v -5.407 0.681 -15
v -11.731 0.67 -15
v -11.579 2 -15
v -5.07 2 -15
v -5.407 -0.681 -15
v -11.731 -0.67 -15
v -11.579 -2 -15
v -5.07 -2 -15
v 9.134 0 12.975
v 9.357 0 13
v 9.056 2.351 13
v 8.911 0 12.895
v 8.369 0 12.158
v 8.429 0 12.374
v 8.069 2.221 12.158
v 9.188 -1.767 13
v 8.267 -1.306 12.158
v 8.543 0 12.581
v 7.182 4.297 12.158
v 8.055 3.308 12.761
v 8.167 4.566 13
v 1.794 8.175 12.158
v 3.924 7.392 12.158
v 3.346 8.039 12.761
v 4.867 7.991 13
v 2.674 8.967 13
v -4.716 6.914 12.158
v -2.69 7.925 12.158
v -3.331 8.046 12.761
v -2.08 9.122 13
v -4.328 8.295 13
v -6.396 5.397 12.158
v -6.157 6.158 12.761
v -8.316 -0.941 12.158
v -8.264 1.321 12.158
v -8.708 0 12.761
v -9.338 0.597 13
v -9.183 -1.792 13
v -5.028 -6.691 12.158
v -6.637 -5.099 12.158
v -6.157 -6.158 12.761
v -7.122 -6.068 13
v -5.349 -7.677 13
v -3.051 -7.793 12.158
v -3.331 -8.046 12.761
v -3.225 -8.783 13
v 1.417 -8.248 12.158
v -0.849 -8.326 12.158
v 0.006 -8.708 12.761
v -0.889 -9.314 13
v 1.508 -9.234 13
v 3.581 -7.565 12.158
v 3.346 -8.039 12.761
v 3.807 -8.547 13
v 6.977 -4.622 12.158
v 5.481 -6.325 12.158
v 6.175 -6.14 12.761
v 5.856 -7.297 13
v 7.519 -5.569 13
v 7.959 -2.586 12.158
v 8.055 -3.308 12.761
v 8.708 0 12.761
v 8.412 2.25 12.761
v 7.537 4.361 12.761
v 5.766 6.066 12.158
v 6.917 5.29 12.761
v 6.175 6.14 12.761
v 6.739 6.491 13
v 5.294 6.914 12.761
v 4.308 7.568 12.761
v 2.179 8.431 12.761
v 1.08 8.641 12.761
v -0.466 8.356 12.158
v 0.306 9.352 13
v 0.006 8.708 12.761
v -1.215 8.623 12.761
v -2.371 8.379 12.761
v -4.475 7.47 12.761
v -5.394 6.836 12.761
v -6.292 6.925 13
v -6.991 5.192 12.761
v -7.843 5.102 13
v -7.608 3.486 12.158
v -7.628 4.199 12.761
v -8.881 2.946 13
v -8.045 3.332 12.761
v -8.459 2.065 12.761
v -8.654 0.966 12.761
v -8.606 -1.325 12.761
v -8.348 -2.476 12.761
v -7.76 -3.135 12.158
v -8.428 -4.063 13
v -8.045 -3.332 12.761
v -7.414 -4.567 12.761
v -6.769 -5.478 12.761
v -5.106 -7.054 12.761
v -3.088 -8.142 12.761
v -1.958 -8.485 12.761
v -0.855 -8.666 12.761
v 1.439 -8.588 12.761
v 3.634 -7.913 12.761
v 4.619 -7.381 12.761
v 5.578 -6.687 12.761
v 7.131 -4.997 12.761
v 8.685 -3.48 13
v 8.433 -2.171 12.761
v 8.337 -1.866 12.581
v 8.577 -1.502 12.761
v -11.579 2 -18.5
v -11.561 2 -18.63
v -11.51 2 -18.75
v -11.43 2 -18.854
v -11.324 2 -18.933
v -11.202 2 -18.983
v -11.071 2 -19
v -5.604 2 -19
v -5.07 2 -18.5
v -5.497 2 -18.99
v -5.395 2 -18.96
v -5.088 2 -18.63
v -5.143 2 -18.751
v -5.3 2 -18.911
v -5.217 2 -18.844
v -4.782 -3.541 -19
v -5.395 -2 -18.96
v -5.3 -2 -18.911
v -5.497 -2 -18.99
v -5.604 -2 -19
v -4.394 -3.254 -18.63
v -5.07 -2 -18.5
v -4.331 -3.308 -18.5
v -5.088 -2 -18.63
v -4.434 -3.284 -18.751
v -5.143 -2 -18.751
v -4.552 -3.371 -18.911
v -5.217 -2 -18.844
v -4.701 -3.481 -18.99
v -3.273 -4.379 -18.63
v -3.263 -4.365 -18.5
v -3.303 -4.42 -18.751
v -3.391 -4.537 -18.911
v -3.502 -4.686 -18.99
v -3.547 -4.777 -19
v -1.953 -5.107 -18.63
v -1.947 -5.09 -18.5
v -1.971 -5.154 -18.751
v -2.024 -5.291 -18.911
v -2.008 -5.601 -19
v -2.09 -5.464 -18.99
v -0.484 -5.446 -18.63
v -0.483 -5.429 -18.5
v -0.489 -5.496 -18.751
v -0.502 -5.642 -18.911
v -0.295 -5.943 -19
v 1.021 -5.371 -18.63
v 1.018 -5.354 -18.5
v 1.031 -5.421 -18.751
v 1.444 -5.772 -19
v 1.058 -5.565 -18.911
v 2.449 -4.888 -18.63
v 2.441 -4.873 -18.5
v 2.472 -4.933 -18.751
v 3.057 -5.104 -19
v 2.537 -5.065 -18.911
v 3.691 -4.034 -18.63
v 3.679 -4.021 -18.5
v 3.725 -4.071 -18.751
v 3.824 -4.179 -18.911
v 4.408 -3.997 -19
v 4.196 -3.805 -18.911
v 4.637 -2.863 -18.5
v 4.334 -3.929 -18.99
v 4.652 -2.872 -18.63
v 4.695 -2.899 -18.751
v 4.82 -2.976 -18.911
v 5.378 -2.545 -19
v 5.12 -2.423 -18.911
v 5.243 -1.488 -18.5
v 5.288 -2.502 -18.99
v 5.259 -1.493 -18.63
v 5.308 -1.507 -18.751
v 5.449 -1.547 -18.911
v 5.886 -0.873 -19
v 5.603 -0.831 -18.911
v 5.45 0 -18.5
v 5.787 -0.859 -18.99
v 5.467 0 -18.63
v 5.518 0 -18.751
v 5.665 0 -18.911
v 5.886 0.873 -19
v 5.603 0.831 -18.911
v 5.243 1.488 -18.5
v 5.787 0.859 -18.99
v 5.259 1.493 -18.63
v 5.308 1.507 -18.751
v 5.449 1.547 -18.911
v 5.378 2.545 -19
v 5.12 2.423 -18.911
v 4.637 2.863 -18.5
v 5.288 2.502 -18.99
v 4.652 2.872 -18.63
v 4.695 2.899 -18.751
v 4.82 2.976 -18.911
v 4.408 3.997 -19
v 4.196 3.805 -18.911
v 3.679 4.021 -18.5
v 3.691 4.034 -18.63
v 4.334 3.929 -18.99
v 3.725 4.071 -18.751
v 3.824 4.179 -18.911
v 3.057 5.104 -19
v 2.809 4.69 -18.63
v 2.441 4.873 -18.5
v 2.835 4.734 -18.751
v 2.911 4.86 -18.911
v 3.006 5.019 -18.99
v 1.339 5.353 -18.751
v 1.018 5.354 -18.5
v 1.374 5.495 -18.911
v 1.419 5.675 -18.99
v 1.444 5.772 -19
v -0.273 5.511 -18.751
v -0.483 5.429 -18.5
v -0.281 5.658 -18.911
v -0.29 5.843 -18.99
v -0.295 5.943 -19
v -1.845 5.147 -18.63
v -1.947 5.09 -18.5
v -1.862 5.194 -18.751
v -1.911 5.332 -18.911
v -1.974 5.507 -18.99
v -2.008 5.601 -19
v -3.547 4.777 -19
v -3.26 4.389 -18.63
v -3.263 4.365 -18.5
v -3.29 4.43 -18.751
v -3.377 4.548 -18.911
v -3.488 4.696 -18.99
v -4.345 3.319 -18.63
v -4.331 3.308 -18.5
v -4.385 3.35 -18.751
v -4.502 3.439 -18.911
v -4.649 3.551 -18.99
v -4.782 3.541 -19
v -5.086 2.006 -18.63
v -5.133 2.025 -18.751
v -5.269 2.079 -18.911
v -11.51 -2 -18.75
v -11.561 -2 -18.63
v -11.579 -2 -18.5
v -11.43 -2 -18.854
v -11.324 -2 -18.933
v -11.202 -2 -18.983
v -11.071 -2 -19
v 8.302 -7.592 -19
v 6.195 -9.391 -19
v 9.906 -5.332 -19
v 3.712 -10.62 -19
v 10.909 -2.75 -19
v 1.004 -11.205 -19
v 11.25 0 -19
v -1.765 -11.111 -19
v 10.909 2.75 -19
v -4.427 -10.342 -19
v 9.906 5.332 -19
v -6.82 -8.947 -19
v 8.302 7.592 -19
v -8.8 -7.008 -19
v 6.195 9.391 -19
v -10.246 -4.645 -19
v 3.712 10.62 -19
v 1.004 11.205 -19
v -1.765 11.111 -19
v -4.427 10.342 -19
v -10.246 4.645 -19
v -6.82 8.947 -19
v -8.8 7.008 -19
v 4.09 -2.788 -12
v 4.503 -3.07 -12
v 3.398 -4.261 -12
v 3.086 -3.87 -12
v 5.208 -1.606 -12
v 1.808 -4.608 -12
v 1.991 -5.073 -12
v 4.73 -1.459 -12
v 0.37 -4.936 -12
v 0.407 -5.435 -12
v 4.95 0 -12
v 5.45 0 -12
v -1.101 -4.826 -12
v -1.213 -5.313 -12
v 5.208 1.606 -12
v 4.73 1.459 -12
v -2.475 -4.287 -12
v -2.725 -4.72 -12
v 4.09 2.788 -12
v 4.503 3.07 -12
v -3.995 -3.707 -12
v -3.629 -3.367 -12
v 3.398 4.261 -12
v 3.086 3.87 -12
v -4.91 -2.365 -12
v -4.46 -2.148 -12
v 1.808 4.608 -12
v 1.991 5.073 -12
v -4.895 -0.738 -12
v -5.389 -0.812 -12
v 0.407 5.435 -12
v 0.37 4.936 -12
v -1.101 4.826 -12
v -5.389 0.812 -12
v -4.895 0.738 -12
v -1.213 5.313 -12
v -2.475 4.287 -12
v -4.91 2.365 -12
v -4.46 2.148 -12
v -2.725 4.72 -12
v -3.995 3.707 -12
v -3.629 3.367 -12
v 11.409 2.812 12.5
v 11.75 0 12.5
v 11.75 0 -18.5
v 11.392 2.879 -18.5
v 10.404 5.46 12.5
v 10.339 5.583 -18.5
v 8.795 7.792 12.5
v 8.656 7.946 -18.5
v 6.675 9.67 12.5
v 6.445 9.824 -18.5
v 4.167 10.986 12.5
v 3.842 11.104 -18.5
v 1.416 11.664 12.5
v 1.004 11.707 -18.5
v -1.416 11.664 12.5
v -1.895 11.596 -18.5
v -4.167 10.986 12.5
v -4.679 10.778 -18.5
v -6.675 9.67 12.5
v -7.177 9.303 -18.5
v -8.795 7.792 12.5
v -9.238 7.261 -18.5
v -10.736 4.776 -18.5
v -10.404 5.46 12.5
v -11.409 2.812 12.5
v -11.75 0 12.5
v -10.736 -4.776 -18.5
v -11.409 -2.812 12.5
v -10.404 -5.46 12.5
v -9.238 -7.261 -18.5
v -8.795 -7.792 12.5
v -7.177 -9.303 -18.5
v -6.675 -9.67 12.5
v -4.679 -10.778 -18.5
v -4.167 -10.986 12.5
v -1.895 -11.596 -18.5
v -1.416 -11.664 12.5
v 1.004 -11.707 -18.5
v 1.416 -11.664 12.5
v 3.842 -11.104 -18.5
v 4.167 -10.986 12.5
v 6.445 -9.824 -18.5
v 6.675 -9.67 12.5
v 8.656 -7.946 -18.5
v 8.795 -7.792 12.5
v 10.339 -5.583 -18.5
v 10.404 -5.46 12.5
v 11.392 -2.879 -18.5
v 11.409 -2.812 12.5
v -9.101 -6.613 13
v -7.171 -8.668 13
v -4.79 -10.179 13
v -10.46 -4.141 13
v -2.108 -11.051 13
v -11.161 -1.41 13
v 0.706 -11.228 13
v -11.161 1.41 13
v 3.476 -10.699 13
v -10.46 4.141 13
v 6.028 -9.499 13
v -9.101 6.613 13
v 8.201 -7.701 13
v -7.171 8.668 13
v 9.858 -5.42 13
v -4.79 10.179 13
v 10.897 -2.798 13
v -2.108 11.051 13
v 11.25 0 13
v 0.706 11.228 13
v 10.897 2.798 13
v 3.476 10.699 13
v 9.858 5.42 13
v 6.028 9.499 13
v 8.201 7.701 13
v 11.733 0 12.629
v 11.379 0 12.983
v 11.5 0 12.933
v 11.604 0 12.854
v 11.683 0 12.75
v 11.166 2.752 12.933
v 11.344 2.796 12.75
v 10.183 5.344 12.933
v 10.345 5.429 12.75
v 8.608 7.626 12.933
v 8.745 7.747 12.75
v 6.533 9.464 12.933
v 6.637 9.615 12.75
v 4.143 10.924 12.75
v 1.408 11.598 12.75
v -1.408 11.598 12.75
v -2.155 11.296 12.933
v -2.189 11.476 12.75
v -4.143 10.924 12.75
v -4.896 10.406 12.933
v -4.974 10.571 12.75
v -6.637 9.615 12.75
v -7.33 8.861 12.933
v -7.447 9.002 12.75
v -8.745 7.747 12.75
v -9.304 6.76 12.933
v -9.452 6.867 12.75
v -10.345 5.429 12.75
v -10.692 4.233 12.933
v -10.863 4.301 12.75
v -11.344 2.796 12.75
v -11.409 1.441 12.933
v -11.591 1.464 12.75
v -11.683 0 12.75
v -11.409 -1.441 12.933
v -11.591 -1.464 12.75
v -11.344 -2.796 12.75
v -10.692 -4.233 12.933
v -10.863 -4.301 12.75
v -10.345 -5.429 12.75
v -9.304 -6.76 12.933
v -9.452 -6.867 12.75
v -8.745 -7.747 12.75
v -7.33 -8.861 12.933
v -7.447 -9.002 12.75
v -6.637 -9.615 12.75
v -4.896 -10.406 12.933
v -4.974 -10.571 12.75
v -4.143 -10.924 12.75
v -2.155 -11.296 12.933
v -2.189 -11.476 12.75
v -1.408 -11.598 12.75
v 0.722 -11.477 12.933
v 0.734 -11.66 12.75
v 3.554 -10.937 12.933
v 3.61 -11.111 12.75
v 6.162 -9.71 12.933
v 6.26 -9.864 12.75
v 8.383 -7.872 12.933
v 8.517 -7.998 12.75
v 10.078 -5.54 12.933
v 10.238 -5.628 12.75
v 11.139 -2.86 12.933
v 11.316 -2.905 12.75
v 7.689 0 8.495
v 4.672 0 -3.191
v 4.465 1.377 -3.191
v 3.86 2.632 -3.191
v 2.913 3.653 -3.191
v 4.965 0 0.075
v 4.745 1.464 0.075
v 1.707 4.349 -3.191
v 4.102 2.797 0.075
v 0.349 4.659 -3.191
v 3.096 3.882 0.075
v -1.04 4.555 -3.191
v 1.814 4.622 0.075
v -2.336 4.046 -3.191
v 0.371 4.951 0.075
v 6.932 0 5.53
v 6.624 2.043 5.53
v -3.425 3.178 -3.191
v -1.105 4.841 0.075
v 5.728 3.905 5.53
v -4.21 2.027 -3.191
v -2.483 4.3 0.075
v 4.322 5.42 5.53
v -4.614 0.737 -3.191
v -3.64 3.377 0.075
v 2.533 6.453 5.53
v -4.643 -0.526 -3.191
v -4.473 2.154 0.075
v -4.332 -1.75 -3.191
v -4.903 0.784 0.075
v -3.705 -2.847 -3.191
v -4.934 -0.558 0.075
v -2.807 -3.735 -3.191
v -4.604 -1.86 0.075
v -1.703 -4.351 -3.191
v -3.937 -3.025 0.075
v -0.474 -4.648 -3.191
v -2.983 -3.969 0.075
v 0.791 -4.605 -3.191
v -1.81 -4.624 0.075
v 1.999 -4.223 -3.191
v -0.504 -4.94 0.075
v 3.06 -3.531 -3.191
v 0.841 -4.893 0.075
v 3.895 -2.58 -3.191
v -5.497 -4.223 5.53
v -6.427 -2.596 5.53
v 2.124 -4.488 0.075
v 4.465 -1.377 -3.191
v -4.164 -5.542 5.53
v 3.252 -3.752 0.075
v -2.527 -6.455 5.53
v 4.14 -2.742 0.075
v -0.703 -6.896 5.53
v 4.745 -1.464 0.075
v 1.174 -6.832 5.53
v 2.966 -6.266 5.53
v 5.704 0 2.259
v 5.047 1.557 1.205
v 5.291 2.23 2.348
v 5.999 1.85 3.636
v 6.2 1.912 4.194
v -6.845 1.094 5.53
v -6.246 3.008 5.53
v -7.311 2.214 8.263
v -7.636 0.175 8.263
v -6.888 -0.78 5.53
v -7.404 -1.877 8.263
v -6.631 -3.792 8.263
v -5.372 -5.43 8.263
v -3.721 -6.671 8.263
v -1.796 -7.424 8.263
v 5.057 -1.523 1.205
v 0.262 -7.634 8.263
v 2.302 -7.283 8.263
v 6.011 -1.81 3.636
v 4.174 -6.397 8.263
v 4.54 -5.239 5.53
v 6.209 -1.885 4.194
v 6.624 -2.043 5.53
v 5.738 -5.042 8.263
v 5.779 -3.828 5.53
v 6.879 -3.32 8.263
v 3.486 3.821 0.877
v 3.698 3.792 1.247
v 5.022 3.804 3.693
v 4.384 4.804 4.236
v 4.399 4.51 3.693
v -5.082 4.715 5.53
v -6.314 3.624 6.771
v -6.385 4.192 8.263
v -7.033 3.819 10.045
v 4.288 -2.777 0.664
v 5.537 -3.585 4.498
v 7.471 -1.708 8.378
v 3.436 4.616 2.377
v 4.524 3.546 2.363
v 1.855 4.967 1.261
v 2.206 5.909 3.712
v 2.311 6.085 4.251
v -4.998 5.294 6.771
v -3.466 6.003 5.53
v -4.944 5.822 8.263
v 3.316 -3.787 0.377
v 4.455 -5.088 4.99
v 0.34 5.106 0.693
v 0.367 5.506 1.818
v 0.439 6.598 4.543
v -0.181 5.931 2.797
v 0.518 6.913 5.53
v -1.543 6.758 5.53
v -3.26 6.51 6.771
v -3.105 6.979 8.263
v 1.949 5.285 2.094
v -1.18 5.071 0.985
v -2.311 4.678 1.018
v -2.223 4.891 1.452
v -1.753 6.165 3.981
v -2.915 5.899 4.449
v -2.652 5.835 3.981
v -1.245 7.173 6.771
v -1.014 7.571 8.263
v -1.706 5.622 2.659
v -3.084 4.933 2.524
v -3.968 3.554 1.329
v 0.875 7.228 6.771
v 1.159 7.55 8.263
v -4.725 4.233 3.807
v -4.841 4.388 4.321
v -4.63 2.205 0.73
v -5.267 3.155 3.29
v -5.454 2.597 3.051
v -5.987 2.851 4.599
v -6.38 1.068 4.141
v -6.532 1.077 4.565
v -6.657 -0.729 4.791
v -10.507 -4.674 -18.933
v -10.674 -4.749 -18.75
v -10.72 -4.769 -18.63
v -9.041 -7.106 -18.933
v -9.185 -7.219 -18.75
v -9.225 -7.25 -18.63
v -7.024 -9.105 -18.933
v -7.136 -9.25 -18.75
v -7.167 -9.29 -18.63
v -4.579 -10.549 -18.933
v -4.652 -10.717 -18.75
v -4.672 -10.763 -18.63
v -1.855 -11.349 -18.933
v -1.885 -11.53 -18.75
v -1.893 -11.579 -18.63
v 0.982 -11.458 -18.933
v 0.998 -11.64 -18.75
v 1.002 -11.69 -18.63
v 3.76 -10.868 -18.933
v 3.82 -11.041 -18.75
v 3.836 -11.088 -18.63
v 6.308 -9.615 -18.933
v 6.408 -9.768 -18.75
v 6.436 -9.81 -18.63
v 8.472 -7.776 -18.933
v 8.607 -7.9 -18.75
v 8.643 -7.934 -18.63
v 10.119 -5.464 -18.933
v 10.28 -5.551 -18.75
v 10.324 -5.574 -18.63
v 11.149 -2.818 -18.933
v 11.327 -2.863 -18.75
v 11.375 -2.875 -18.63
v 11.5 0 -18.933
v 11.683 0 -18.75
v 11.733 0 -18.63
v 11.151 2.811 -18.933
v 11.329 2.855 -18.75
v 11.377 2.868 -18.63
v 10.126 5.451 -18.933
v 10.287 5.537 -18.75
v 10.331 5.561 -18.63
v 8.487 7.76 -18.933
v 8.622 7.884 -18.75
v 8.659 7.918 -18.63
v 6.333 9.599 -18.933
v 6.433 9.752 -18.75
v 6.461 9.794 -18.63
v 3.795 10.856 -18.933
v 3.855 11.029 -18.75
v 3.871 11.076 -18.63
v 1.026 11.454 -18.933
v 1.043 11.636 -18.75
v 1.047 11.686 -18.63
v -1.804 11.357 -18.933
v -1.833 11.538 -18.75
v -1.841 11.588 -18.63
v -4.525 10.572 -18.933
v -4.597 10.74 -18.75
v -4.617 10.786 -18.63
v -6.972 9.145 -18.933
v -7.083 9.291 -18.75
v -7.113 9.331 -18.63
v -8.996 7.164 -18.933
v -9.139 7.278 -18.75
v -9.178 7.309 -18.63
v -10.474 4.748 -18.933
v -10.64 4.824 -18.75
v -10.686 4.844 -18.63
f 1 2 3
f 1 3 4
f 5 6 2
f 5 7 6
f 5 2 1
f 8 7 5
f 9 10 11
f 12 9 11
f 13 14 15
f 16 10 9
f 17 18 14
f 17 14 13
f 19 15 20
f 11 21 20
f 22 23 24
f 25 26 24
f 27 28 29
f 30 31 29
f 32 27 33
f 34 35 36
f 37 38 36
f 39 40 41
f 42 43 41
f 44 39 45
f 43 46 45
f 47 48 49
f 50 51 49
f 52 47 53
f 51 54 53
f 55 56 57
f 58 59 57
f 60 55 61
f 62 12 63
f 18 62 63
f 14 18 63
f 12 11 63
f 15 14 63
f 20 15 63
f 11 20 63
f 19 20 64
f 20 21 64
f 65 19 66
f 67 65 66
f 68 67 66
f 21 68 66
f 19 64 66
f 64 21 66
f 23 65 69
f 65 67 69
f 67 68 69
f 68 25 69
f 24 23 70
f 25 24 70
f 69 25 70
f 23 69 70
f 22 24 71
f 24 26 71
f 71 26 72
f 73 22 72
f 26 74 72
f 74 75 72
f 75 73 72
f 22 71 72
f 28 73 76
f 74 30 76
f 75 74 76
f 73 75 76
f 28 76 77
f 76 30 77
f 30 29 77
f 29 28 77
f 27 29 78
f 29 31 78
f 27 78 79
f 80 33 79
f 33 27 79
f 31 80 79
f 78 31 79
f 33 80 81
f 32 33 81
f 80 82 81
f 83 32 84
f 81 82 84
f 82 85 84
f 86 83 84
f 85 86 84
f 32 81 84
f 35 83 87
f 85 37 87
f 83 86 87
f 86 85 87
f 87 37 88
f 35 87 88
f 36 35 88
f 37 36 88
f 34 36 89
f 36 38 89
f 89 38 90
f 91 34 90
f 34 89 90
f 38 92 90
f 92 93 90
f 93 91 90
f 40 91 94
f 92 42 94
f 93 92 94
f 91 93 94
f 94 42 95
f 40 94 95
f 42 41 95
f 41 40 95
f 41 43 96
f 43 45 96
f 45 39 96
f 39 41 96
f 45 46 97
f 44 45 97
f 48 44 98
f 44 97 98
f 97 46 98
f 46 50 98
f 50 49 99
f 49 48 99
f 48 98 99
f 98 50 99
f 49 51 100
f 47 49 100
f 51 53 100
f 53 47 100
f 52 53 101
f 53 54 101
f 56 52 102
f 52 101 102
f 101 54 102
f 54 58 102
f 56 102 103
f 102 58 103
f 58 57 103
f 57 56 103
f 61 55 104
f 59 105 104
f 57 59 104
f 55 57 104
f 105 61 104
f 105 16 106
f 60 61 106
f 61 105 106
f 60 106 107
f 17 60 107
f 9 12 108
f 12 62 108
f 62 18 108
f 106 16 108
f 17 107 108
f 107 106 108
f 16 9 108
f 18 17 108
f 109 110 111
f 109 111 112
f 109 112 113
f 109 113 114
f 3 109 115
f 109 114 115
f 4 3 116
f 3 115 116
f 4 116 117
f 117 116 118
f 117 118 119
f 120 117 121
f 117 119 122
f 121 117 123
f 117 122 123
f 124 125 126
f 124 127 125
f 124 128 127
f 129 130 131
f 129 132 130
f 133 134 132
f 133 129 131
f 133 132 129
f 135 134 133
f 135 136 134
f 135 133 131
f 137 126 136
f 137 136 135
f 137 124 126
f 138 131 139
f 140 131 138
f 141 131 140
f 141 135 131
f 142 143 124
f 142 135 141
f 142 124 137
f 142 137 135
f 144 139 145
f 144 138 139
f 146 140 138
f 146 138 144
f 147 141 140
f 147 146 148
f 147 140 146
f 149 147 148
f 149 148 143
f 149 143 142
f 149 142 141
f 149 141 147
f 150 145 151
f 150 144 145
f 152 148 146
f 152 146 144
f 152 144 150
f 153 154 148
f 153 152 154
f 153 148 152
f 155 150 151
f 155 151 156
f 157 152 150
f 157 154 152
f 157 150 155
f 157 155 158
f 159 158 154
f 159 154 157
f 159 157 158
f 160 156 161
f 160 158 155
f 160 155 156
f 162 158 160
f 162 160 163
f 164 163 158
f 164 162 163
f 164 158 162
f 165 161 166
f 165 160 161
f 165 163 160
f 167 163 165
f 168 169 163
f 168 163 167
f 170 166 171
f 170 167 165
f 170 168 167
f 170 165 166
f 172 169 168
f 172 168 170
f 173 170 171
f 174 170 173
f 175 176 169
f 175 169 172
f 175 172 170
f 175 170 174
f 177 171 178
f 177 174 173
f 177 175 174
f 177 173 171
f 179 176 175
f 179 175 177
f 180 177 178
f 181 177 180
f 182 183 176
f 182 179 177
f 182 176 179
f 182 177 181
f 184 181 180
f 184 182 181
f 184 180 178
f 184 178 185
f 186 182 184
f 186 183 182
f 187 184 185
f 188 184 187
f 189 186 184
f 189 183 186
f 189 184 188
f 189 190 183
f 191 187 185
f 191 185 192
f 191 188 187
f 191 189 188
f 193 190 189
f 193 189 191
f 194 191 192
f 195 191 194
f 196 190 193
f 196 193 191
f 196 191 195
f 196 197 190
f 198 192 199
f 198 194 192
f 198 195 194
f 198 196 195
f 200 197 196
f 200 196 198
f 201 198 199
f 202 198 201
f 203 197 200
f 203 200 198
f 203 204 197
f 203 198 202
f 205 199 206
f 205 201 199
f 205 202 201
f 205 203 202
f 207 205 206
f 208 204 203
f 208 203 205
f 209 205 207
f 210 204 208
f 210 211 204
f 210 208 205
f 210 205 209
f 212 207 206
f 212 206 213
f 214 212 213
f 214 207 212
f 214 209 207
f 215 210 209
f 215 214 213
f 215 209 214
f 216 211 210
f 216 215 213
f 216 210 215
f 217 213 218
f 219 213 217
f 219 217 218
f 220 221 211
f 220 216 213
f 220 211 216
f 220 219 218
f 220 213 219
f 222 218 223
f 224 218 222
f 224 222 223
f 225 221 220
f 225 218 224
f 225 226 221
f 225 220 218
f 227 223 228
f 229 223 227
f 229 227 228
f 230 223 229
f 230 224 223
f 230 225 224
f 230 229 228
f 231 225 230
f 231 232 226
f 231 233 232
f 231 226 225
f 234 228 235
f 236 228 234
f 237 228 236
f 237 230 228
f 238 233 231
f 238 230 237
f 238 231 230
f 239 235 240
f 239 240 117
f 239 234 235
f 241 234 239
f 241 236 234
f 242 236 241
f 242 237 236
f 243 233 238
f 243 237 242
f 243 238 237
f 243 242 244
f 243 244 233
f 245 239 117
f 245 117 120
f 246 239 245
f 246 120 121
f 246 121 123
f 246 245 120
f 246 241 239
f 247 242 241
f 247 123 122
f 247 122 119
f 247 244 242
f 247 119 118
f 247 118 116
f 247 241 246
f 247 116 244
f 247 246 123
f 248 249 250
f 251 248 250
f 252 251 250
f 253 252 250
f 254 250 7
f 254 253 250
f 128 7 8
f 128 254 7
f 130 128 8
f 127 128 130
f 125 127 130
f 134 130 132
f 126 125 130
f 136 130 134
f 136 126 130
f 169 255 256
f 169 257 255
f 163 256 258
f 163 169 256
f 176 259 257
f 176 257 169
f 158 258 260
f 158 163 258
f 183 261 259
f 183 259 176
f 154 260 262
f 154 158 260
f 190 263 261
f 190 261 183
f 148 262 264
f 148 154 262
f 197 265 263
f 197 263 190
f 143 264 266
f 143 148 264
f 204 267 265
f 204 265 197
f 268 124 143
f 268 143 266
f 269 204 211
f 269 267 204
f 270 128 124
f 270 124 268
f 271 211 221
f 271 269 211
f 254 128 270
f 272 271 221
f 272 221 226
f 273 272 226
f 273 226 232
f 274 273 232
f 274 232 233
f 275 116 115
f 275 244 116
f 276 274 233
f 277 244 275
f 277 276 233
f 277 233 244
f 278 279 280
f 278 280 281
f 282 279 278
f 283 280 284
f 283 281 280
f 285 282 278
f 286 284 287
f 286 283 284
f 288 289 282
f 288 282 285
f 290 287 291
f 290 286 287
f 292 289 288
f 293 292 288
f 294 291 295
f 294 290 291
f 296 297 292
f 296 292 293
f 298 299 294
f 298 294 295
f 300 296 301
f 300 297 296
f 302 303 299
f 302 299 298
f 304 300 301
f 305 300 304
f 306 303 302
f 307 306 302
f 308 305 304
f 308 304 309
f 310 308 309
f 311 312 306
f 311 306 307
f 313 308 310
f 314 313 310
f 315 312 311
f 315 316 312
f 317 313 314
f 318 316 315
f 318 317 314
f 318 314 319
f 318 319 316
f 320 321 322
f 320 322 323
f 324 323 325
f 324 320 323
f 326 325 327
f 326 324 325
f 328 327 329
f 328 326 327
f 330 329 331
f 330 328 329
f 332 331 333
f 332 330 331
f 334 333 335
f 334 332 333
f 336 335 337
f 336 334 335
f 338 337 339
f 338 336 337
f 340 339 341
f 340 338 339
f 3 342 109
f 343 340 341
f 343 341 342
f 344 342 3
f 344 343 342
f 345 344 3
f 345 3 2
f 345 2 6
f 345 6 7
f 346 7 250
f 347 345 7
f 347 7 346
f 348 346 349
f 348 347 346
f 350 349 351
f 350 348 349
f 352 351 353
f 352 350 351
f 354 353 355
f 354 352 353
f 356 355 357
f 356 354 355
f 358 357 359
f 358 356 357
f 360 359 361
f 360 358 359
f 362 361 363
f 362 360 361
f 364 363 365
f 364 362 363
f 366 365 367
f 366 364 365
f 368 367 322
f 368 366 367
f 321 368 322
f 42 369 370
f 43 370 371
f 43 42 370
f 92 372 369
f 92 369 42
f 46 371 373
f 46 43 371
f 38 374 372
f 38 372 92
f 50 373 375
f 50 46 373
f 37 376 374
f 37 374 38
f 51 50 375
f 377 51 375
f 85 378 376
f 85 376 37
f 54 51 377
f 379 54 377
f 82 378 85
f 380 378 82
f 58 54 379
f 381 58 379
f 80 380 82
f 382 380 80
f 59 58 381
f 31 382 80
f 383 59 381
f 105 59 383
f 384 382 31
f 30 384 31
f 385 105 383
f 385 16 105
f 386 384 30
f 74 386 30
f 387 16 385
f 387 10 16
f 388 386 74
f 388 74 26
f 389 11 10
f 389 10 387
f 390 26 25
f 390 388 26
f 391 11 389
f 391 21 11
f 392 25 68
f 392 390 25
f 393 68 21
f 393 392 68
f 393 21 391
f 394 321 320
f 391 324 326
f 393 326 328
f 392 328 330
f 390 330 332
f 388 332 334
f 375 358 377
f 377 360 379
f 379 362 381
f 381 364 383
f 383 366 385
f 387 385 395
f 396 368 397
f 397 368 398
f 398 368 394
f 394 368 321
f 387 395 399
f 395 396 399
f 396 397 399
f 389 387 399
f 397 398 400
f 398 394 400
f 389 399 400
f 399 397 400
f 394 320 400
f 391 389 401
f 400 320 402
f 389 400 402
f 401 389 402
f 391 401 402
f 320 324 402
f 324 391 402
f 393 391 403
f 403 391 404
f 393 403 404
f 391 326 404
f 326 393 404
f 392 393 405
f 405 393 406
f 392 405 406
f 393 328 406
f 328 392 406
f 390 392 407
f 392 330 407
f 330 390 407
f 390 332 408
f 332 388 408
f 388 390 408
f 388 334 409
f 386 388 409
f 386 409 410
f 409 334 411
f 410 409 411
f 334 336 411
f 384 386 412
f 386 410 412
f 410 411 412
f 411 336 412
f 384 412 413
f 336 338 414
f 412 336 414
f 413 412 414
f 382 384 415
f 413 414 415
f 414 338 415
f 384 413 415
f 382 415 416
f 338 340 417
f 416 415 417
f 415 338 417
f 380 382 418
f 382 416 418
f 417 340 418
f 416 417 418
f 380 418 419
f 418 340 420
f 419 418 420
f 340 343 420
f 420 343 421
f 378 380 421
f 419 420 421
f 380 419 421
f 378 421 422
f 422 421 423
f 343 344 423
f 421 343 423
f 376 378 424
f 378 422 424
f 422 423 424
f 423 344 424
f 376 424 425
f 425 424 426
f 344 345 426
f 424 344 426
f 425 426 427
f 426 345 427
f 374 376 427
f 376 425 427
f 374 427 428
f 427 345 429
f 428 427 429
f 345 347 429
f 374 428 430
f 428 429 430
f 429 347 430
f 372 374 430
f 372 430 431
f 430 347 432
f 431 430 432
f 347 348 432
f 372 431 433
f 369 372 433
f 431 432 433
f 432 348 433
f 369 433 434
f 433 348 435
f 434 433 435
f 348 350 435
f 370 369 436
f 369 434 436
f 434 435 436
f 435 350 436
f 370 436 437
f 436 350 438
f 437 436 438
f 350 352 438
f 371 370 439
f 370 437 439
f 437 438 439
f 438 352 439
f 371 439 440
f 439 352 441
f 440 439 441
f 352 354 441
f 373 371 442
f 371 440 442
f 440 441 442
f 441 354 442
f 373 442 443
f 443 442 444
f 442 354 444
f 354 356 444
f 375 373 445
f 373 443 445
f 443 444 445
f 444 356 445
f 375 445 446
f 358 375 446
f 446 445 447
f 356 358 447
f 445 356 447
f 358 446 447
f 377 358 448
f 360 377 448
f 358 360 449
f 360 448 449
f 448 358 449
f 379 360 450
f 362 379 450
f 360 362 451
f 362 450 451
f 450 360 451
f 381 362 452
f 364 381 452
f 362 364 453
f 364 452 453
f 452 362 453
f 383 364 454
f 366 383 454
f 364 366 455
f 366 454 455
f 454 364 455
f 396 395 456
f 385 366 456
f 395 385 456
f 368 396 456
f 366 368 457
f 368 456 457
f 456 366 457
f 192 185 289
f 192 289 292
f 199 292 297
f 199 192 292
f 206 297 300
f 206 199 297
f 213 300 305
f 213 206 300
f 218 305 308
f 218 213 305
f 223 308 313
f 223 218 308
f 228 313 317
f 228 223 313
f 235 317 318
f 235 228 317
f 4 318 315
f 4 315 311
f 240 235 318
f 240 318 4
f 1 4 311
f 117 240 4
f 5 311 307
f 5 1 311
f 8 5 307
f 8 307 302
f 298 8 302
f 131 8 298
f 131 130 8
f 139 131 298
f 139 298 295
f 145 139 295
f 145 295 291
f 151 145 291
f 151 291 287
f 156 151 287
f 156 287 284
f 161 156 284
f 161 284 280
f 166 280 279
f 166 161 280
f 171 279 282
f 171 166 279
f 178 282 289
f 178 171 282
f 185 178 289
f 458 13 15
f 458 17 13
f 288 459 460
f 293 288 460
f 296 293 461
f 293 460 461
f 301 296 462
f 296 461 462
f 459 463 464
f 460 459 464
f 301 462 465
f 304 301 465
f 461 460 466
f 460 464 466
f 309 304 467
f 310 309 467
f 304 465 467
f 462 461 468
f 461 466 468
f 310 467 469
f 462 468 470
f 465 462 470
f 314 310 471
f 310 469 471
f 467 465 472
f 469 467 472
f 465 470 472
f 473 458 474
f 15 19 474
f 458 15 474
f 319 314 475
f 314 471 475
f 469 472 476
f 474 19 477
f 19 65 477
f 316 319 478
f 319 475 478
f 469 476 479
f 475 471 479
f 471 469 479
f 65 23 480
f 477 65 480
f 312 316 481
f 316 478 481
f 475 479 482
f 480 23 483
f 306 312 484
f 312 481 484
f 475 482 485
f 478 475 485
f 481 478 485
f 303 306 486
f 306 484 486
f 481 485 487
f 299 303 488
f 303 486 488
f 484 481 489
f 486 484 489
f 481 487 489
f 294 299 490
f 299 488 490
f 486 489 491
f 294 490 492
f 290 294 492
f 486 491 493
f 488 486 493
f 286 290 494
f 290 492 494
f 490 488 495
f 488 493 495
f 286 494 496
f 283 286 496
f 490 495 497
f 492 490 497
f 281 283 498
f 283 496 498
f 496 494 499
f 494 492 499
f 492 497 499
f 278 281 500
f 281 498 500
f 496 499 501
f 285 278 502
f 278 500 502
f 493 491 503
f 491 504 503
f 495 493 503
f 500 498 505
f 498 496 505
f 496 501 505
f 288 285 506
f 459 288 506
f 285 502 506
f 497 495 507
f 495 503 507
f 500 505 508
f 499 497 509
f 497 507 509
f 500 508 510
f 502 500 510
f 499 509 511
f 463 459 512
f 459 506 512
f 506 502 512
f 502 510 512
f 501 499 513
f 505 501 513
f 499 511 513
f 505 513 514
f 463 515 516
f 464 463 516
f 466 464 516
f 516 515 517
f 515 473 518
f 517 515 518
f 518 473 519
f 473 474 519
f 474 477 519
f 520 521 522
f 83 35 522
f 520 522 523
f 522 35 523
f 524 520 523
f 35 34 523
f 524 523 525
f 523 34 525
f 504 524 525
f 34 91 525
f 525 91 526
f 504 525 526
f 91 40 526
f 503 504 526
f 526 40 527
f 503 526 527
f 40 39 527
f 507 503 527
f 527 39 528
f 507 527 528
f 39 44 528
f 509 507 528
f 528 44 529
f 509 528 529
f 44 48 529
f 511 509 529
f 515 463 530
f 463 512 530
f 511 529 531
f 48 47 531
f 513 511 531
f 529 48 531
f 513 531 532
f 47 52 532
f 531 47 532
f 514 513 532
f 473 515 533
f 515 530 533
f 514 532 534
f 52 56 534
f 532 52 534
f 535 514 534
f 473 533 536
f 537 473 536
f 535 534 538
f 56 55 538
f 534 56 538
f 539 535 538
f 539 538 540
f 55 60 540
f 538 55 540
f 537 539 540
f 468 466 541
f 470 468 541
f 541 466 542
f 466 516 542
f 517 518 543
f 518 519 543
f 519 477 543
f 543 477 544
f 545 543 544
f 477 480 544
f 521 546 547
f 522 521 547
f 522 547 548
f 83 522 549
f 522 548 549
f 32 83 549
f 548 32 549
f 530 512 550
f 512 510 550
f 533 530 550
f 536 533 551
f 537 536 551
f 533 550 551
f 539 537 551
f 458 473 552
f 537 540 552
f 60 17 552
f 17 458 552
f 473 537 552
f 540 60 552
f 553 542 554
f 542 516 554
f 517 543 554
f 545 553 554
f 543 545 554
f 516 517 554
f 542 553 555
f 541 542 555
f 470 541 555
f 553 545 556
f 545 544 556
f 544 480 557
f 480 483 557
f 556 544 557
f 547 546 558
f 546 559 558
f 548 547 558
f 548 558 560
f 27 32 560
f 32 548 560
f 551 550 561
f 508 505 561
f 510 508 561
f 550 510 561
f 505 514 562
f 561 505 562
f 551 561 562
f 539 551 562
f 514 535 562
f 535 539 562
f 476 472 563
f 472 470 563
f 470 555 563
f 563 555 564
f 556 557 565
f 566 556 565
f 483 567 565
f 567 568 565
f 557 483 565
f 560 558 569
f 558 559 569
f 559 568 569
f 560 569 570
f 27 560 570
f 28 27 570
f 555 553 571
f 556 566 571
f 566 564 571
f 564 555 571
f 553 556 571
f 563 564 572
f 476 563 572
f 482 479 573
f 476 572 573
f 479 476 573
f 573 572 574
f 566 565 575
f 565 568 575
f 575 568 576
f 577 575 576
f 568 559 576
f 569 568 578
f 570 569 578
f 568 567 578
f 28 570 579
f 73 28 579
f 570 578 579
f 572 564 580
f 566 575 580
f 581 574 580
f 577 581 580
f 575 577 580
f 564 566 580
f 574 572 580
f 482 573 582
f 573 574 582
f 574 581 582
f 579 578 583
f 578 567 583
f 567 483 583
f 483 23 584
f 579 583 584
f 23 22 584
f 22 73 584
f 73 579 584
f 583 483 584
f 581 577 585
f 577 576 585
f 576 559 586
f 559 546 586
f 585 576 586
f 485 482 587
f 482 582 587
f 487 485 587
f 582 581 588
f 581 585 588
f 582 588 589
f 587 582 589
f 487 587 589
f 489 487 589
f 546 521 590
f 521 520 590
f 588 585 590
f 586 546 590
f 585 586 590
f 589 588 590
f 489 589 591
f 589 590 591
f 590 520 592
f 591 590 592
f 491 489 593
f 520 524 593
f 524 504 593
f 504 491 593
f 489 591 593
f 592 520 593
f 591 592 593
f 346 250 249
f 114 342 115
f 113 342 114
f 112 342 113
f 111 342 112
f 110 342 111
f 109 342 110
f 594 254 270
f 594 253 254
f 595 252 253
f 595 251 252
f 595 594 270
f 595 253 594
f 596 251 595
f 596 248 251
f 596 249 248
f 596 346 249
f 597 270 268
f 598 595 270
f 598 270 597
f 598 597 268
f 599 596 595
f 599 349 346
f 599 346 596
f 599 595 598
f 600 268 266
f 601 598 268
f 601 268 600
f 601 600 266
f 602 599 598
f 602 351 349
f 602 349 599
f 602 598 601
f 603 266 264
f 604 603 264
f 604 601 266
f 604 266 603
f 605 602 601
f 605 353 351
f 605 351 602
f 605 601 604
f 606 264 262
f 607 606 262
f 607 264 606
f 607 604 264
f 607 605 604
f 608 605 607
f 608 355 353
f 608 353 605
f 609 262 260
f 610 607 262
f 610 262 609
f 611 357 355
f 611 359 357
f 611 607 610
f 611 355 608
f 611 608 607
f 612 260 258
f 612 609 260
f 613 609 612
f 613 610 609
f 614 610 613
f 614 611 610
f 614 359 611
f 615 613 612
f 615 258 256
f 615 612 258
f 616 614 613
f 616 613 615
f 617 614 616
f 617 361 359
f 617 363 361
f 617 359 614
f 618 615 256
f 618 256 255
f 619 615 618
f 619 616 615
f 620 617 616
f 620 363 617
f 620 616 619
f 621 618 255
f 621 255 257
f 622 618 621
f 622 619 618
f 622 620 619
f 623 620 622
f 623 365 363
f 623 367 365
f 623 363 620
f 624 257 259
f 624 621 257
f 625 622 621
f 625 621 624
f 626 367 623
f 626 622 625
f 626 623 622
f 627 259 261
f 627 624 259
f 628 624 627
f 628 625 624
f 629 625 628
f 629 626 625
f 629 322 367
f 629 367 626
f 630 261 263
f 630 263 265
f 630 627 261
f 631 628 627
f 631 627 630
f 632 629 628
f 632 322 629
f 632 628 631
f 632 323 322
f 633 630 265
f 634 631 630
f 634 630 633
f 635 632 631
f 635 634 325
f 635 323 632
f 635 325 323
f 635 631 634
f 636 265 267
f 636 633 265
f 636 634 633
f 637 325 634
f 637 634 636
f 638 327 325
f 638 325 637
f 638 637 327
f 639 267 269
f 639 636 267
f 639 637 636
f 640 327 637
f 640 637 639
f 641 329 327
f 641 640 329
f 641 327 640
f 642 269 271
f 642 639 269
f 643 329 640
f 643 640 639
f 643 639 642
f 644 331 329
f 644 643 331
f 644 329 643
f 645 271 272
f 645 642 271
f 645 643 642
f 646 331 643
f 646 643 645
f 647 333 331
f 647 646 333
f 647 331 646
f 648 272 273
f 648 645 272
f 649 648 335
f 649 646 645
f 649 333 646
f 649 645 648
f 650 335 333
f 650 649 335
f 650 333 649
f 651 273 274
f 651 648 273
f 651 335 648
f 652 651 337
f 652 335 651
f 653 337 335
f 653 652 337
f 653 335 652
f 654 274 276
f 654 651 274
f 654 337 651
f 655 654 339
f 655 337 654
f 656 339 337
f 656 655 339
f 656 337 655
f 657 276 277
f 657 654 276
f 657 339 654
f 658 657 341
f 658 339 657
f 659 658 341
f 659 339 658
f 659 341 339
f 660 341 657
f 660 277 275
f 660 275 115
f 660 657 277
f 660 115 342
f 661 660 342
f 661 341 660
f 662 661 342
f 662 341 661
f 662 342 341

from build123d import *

# Parameters (mm, degrees)
F2_R     = 0.5
F3_R     = 1
F4_W     = 8
F4_H     = 4
F5_DEPTH = 4


with BuildPart() as f1:
    # F0 (on Front) → F1 (revolve)
    with BuildSketch(Plane.XZ):
        with BuildLine():
            Line((11.75, 13), (8.5, 13))
            add(Edge.make_bspline(
                [(4.95, -12), (4.7483998648, -7.495611577), (4.0750163359, 2.4314636076), (7.0308667384, 3.2642442145), (8.5, 13)],
                knots=[0, 0, 0, 0, 0.4855036305, 1, 1, 1, 1], degree=3))
            Line((4.95, -12), (5.45, -12))
            Line((5.45, -12), (5.45, -19))
            Line((5.45, -19), (11.75, -19))
            Line((11.75, -19), (11.75, 13))
        make_face()
    revolve(axis=Axis((0, 0, 6.5), (0, 0, 1)))

    # F2
    f2_edges = [f1.edges().sort_by_distance(p)[0] for p in [
        (-11.75, 0, 13),
        (-11.75, 0, -19),
        (-5.45, 0, -19),
    ]]
    fillet(f2_edges, radius=F2_R)

    # F3
    f3_edges = [f1.edges().sort_by_distance(p)[0] for p in [
        (-8.5, 0, 13),
    ]]
    fillet(f3_edges, radius=F3_R)

    # F4 (on face) → F5 (cut)
    with BuildSketch(Plane(origin=(0, 0, -19), x_dir=(1, 0, 0), z_dir=(0, 0, -1))):
        with Locations((-8.7, 0)):
            Rectangle(F4_W, F4_H)
    extrude(amount=-F5_DEPTH, mode=Mode.SUBTRACT)


solid = f1.part
